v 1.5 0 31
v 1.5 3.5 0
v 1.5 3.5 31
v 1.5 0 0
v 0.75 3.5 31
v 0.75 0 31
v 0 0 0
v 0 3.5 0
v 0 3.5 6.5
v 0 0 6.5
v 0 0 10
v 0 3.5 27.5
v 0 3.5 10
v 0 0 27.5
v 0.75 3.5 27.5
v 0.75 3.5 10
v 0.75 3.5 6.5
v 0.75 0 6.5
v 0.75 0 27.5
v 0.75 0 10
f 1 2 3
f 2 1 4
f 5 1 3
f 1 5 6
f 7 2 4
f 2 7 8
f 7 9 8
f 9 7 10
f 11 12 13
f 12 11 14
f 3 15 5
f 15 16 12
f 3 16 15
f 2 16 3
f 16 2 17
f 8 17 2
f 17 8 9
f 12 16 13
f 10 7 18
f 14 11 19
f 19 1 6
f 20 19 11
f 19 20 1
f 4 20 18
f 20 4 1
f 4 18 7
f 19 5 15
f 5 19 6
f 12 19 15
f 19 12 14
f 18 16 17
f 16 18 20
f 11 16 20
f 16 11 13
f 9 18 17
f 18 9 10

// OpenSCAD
// file: ../config.scad
// height of desktop and shelves
desktop_shelf_color="Sienna";
desktop_height=31;
desktop_thickness=0.75;
table_width=96;
table_depth=36;
shelf_thickness=0.5;
shelf_height=6;
top_shelf_height=72.5;
hutch_shelf_height=50;
left_lower_shelf_height=22;
left_lower_shelf_thickness=0.25;

// Legs
front_leg_length=desktop_height;
rear_leg_length=top_shelf_height-shelf_thickness;
leg_timber_width=1.5;
leg_timber_depth=3.5;
center_leg_timber_width=1.5;
center_leg_timber_depth=3.5;
center_leg_setback=24;

// Parts Shelves
parts_shelf_thickness = 0.35;
parts_shelf_spacing = 0.15;
parts_plate_thickness = 0.2;
parts_support_depth = 0.25;
parts_shelf_depth = 11;
parts_support_height = 11;
parts_shelf_width = (table_width/4)-(center_leg_timber_width*2)-(parts_plate_thickness*2);

// Plates
strut_timber_depth=1.5;
strut_timber_height=3.5;
top_shelf_timber_depth=3.5;
top_shelf_timber_height=1.5;
// file: ../components/leg_short_NOTleft.scad
module leg_short_NOTleft()
{
    include <../config.scad>
    leg_length = front_leg_length;
    echo(str("BOM ITEM: leg_short_NOTleft"));
    render() { // see note in README about rendering
        difference() {
            cube([leg_timber_width,leg_timber_depth,leg_length],false);

            // Top rabbets
            translate([0,0,desktop_height-strut_timber_height])
            {
                // rabbet cut on short side
                cube([strut_timber_depth/2,leg_timber_depth,strut_timber_height],false);
            }

            // Bottom rabbets
            translate([0,0,shelf_height-strut_timber_height])
            {
                // rabbet cut on short side
                cube([strut_timber_depth/2,leg_timber_depth,strut_timber_height],false);
            }
        }
    }
}
// main file
use <../components/leg_short_NOTleft.scad>

leg_short_NOTleft();
